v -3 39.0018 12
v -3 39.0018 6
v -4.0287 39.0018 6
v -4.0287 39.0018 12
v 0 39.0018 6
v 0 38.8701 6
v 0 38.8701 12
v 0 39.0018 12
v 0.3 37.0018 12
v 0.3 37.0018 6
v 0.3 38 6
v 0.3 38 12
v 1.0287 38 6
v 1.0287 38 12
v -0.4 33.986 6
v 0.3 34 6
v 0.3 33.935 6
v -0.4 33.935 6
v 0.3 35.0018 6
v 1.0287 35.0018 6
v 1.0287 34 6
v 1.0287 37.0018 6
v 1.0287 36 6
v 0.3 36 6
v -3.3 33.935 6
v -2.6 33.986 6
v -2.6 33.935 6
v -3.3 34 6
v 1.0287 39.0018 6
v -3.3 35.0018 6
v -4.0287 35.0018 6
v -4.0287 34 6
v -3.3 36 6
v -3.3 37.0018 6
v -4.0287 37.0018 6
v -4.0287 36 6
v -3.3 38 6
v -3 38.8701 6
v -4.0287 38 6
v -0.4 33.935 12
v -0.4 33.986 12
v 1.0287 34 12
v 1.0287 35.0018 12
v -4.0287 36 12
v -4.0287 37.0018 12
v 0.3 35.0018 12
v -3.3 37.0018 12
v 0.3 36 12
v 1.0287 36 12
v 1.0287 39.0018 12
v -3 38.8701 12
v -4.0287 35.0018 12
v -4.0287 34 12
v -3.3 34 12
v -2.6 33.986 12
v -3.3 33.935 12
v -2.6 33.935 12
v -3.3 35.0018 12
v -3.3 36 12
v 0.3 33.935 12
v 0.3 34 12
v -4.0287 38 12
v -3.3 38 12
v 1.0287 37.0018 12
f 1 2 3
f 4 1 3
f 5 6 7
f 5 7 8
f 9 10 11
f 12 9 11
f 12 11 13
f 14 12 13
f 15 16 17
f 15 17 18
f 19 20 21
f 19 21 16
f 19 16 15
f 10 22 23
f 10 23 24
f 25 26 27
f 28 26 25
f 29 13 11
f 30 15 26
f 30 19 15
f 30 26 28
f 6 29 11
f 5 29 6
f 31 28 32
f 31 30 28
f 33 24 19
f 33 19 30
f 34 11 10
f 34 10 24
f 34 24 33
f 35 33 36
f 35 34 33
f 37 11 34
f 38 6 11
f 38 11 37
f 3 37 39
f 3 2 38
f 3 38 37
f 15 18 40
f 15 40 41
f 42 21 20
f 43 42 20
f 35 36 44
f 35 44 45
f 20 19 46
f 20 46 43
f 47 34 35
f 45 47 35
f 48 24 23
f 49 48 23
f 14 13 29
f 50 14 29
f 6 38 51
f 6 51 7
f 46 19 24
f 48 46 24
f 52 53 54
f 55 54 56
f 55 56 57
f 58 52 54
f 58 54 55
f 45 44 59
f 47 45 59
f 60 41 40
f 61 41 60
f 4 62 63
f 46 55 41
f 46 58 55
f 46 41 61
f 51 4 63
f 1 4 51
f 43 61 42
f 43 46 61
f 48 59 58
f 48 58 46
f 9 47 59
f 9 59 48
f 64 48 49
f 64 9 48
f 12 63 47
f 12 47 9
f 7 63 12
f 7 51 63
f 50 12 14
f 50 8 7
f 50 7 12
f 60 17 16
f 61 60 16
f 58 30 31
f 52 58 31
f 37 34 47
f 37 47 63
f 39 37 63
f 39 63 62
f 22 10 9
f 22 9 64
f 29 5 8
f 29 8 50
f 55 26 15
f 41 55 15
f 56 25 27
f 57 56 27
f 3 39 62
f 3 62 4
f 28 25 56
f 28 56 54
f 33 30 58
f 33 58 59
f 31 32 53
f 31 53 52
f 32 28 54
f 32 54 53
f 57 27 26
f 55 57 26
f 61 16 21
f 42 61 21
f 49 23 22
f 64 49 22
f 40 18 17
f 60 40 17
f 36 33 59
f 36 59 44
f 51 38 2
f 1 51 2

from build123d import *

# Parameters (mm, degrees)
DWIRE022_W       = 9.039794
DWIRE022_H       = 6.083538
EXTRUDE025_DEPTH = 6
DWIRE007_W       = 1.028705
DWIRE007_H       = 1.001781
EXTRUDE007_DEPTH = 9
ARRAY001_Y_COUNT = 20
ARRAY001_Y_PITCH = 2
DWIRE016_W       = 0.7
DWIRE016_H       = 38.839707
EXTRUDE019_DEPTH = 9
DWIRE021_W       = 3.095468
DWIRE021_H       = 4.884044
EXTRUDE024_DEPTH = 6


with BuildPart() as maska_kostki_naciagu:
    # DWire022 → Extrude025 (new body)
    with BuildSketch(Plane.XY):
        with Locations((-2.105889, 36.976721)):
            Rectangle(DWIRE022_W, DWIRE022_H)
    extrude(amount=EXTRUDE025_DEPTH)


with BuildPart() as maska_kostki_naciagu_1:
    # Extrude025 placement: moved
    add(maska_kostki_naciagu.part.moved(Location((0, 0, 6))))


with BuildPart() as zeby_paska:
    # DWire007 → Extrude007 (new body)
    with BuildSketch(Plane.XY):
        with Locations((0.514352, 0.500891)):
            Rectangle(DWIRE007_W, DWIRE007_H)
    extrude(amount=EXTRUDE007_DEPTH)


with BuildPart() as zeby_paska_1:
    # Extrude007 placement: moved
    add(zeby_paska.part.moved(Location((0, 0, 6))))

    # Array001 Y: zeby paska ×20


with BuildPart() as zeby_paska_2:
    add(zeby_paska_1.part)
    with Locations(*[(0, i * ARRAY001_Y_PITCH, 0) for i in range(1, ARRAY001_Y_COUNT)]):
        add(zeby_paska_1.part)


with BuildPart() as pasek:
    # DWire016 → Extrude019 (new body)
    with BuildSketch(Plane.XY):
        with Locations((-0.05, 19.419853)):
            Rectangle(DWIRE016_W, DWIRE016_H)
    extrude(amount=EXTRUDE019_DEPTH)


with BuildPart() as pasek_1:
    # Extrude019 placement: moved
    add(pasek.part.moved(Location((0, 0, 6))))

    # Fusion002: union zeby paska
    add(zeby_paska_2.part)


with BuildPart() as pasek001:
    # Clone005 base: copy of pasek
    add(pasek_1.part)


with BuildPart() as part_mirroring004:
    # Part__Mirroring004: instance of pasek001
    add(pasek001.part.mirror(Plane(origin=(0, 0, 0), x_dir=(0, -1, 0), z_dir=(1, 0, 0))))


with BuildPart() as part_mirroring004_1:
    # Part__Mirroring004 placement: moved
    add(part_mirroring004.part.moved(Location((-3, 0, 0))))


with BuildPart() as extrude024:
    # DWire021 → Extrude024 (new body)
    with BuildSketch(Plane.XY):
        with Locations((-1.547734, 36.428072)):
            Rectangle(DWIRE021_W, DWIRE021_H)
    extrude(amount=EXTRUDE024_DEPTH)


with BuildPart() as extrude024_1:
    # Extrude024 placement: moved
    add(extrude024.part.moved(Location((0, 0, 6))))


with BuildPart() as test_kostka_naciagu_paska:
    # Fusion003 base: copy of pasek
    add(pasek_1.part)

    # Fusion003: union Part__Mirroring004, Extrude024
    add(part_mirroring004_1.part)
    add(extrude024_1.part)

    # Common: intersect maska kostki naciagu
    add(maska_kostki_naciagu_1.part, mode=Mode.INTERSECT)


solid = test_kostka_naciagu_paska.part
